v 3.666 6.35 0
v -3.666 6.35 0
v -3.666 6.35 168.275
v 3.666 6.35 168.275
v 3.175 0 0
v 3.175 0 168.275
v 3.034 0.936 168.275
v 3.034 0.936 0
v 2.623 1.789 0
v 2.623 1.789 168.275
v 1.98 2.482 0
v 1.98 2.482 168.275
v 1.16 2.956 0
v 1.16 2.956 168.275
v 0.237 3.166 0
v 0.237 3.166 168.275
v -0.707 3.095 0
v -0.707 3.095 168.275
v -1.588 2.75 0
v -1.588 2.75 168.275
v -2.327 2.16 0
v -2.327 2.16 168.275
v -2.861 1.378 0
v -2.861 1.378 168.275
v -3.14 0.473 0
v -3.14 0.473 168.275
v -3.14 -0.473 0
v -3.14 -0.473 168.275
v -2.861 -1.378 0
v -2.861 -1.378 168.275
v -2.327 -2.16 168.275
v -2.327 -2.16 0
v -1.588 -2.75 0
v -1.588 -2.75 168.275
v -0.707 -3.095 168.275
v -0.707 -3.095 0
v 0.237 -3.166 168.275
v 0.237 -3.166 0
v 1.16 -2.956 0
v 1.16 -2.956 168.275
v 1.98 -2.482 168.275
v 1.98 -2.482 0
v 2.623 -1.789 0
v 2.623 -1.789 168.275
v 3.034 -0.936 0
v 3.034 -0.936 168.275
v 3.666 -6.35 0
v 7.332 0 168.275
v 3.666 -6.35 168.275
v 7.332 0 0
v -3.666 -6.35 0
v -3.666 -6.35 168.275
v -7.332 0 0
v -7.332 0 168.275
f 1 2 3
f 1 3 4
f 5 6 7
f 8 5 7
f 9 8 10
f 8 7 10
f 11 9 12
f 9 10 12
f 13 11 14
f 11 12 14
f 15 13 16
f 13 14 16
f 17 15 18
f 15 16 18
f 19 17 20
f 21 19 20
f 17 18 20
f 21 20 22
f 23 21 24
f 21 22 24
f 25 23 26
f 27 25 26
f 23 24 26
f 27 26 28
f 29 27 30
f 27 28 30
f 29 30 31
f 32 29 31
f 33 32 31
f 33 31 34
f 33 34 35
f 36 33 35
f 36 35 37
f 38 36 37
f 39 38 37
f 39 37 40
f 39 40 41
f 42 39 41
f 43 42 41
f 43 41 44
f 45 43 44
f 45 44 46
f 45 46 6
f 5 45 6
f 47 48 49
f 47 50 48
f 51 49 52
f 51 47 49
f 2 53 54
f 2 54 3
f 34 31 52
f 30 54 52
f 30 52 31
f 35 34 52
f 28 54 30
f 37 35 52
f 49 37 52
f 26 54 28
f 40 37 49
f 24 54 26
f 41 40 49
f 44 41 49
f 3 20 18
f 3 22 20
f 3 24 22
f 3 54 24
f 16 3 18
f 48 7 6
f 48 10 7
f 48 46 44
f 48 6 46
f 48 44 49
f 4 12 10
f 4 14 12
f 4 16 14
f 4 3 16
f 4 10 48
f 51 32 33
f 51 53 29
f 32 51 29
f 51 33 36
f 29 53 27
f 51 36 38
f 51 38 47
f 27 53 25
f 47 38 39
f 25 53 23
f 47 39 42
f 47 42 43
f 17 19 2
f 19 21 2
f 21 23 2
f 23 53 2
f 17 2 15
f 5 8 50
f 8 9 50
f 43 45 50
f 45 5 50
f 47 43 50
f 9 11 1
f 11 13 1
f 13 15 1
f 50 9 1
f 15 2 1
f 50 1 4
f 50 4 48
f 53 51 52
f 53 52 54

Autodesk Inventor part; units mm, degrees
ref_plane "YZ Plane" through (0, 0, 0) normal (1, 0, 0) x (0, 1, 0)
ref_plane "XZ Plane" through (0, 0, 0) normal (0, 1, 0) x (-1, 0, 0)
ref_plane "XY Plane" through (0, 0, 0) normal (0, 0, 1) x (1, 0, 0)
sketch "Sketch1" plane through (0, 0, 0) normal (0, 0, 1) x (1, 0, 0)
  line L0 (7.3323, 0) -> (3.6662, -6.35)
  line L1 (3.6662, -6.35) -> (-3.6662, -6.35)
  line L2 (-3.6662, -6.35) -> (-7.3323, 0)
  line L3 (-7.3323, 0) -> (-3.6662, 6.35)
  line L4 (-3.6662, 6.35) -> (3.6662, 6.35)
  line L5 (3.6662, 6.35) -> (7.3323, 0)
  point P0 (0, 0)
  point P1 (0, 0)
  dimension "d0" = 12.7
extrude "Extrusion1" add sketch "Sketch1" along normal blind 168.275
sketch "Sketch2" plane through (0, 0, 168.275) normal (0, 0, 1) x (1, 0, 0)
  circle A0 centre (0, 0) radius 3.175
  dimension "d3" = 6.35
extrude "Extrusion2" cut sketch "Sketch2" against normal blind 203.2
properties part number "wheel hex shaft"
